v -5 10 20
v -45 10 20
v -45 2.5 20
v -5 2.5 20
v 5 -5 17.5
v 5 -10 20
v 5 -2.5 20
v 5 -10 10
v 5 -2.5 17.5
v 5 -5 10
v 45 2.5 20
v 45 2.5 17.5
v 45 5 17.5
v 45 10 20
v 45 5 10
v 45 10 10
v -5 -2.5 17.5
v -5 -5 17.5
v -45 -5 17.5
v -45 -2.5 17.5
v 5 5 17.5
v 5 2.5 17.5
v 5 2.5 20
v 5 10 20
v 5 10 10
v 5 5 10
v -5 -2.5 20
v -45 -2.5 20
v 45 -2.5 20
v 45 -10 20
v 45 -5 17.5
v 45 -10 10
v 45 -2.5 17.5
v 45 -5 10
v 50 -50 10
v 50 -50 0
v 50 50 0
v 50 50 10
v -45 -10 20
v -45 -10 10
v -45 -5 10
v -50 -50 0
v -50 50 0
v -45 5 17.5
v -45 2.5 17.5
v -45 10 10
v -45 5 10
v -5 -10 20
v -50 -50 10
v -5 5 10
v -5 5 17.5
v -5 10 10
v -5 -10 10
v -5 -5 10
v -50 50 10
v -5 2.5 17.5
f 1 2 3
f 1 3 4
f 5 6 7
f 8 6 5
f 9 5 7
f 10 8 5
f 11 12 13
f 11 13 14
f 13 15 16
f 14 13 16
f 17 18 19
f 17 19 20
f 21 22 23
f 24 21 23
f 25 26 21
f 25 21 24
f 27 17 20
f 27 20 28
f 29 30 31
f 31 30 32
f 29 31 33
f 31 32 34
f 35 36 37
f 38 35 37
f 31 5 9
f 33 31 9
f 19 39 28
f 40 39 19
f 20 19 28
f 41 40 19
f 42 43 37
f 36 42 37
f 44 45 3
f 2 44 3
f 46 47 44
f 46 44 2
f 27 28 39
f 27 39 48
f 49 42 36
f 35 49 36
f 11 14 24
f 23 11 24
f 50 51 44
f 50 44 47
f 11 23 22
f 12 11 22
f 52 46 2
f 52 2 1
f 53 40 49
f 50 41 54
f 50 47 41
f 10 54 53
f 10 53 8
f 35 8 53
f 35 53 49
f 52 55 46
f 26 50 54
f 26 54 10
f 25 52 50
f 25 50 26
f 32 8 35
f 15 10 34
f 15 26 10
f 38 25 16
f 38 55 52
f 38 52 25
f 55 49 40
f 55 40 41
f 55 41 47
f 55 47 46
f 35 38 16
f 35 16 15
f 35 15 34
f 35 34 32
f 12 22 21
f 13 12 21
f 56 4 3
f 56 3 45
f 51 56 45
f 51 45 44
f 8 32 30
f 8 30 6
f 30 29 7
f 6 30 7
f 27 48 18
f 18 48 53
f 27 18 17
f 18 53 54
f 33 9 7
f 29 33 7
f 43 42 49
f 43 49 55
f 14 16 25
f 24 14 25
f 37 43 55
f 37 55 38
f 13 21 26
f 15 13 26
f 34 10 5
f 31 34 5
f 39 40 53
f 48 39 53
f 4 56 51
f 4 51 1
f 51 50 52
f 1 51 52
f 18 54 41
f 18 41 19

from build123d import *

# Parameters (mm, degrees)
SKETCH1_W               = 100
SKETCH1_H               = 100
BACK_PLATE_DEPTH        = 10
SKETCH2_W               = 40
SKETCH2_H               = 20
SLIDER_MOUNT_BOSS_DEPTH = 10
SLIDER_MOUNT_DEPTH      = 77.974021592


with BuildPart() as part:
    # Sketch1 → back plate (new body)
    with BuildSketch(Plane.XY):
        Rectangle(SKETCH1_W, SKETCH1_H)
    extrude(amount=BACK_PLATE_DEPTH)

    # Sketch2 → slider mount boss (add)
    with BuildSketch(Plane.XY.offset(10)):
        with Locations((-25, 0)):
            Rectangle(SKETCH2_W, SKETCH2_H)
    slider_mount_boss = extrude(amount=SLIDER_MOUNT_BOSS_DEPTH)

    # Sketch3 → slider mount (cut, through all)
    with BuildSketch(Plane(origin=(-5, 0, 0), x_dir=(0, 0, -1), z_dir=(1, 0, 0))):
        Polygon((-17.5, 5), (-10, 5), (-10, -5), (-17.5, -5), (-17.5, -2.5), (-20, -2.5), (-20, 2.5), (-17.5, 2.5), align=None)
    slider_mount = extrude(amount=-SLIDER_MOUNT_DEPTH, mode=Mode.SUBTRACT)

    # Mirror3: slider mount boss, slider mount across plane
    add(slider_mount_boss.mirror(Plane(origin=(0, 0, 0), x_dir=(0, 0, 1), z_dir=(1, 0, 0))))
    add(slider_mount.mirror(Plane(origin=(0, 0, 0), x_dir=(0, 0, 1), z_dir=(1, 0, 0))), mode=Mode.SUBTRACT)


solid = part.part
